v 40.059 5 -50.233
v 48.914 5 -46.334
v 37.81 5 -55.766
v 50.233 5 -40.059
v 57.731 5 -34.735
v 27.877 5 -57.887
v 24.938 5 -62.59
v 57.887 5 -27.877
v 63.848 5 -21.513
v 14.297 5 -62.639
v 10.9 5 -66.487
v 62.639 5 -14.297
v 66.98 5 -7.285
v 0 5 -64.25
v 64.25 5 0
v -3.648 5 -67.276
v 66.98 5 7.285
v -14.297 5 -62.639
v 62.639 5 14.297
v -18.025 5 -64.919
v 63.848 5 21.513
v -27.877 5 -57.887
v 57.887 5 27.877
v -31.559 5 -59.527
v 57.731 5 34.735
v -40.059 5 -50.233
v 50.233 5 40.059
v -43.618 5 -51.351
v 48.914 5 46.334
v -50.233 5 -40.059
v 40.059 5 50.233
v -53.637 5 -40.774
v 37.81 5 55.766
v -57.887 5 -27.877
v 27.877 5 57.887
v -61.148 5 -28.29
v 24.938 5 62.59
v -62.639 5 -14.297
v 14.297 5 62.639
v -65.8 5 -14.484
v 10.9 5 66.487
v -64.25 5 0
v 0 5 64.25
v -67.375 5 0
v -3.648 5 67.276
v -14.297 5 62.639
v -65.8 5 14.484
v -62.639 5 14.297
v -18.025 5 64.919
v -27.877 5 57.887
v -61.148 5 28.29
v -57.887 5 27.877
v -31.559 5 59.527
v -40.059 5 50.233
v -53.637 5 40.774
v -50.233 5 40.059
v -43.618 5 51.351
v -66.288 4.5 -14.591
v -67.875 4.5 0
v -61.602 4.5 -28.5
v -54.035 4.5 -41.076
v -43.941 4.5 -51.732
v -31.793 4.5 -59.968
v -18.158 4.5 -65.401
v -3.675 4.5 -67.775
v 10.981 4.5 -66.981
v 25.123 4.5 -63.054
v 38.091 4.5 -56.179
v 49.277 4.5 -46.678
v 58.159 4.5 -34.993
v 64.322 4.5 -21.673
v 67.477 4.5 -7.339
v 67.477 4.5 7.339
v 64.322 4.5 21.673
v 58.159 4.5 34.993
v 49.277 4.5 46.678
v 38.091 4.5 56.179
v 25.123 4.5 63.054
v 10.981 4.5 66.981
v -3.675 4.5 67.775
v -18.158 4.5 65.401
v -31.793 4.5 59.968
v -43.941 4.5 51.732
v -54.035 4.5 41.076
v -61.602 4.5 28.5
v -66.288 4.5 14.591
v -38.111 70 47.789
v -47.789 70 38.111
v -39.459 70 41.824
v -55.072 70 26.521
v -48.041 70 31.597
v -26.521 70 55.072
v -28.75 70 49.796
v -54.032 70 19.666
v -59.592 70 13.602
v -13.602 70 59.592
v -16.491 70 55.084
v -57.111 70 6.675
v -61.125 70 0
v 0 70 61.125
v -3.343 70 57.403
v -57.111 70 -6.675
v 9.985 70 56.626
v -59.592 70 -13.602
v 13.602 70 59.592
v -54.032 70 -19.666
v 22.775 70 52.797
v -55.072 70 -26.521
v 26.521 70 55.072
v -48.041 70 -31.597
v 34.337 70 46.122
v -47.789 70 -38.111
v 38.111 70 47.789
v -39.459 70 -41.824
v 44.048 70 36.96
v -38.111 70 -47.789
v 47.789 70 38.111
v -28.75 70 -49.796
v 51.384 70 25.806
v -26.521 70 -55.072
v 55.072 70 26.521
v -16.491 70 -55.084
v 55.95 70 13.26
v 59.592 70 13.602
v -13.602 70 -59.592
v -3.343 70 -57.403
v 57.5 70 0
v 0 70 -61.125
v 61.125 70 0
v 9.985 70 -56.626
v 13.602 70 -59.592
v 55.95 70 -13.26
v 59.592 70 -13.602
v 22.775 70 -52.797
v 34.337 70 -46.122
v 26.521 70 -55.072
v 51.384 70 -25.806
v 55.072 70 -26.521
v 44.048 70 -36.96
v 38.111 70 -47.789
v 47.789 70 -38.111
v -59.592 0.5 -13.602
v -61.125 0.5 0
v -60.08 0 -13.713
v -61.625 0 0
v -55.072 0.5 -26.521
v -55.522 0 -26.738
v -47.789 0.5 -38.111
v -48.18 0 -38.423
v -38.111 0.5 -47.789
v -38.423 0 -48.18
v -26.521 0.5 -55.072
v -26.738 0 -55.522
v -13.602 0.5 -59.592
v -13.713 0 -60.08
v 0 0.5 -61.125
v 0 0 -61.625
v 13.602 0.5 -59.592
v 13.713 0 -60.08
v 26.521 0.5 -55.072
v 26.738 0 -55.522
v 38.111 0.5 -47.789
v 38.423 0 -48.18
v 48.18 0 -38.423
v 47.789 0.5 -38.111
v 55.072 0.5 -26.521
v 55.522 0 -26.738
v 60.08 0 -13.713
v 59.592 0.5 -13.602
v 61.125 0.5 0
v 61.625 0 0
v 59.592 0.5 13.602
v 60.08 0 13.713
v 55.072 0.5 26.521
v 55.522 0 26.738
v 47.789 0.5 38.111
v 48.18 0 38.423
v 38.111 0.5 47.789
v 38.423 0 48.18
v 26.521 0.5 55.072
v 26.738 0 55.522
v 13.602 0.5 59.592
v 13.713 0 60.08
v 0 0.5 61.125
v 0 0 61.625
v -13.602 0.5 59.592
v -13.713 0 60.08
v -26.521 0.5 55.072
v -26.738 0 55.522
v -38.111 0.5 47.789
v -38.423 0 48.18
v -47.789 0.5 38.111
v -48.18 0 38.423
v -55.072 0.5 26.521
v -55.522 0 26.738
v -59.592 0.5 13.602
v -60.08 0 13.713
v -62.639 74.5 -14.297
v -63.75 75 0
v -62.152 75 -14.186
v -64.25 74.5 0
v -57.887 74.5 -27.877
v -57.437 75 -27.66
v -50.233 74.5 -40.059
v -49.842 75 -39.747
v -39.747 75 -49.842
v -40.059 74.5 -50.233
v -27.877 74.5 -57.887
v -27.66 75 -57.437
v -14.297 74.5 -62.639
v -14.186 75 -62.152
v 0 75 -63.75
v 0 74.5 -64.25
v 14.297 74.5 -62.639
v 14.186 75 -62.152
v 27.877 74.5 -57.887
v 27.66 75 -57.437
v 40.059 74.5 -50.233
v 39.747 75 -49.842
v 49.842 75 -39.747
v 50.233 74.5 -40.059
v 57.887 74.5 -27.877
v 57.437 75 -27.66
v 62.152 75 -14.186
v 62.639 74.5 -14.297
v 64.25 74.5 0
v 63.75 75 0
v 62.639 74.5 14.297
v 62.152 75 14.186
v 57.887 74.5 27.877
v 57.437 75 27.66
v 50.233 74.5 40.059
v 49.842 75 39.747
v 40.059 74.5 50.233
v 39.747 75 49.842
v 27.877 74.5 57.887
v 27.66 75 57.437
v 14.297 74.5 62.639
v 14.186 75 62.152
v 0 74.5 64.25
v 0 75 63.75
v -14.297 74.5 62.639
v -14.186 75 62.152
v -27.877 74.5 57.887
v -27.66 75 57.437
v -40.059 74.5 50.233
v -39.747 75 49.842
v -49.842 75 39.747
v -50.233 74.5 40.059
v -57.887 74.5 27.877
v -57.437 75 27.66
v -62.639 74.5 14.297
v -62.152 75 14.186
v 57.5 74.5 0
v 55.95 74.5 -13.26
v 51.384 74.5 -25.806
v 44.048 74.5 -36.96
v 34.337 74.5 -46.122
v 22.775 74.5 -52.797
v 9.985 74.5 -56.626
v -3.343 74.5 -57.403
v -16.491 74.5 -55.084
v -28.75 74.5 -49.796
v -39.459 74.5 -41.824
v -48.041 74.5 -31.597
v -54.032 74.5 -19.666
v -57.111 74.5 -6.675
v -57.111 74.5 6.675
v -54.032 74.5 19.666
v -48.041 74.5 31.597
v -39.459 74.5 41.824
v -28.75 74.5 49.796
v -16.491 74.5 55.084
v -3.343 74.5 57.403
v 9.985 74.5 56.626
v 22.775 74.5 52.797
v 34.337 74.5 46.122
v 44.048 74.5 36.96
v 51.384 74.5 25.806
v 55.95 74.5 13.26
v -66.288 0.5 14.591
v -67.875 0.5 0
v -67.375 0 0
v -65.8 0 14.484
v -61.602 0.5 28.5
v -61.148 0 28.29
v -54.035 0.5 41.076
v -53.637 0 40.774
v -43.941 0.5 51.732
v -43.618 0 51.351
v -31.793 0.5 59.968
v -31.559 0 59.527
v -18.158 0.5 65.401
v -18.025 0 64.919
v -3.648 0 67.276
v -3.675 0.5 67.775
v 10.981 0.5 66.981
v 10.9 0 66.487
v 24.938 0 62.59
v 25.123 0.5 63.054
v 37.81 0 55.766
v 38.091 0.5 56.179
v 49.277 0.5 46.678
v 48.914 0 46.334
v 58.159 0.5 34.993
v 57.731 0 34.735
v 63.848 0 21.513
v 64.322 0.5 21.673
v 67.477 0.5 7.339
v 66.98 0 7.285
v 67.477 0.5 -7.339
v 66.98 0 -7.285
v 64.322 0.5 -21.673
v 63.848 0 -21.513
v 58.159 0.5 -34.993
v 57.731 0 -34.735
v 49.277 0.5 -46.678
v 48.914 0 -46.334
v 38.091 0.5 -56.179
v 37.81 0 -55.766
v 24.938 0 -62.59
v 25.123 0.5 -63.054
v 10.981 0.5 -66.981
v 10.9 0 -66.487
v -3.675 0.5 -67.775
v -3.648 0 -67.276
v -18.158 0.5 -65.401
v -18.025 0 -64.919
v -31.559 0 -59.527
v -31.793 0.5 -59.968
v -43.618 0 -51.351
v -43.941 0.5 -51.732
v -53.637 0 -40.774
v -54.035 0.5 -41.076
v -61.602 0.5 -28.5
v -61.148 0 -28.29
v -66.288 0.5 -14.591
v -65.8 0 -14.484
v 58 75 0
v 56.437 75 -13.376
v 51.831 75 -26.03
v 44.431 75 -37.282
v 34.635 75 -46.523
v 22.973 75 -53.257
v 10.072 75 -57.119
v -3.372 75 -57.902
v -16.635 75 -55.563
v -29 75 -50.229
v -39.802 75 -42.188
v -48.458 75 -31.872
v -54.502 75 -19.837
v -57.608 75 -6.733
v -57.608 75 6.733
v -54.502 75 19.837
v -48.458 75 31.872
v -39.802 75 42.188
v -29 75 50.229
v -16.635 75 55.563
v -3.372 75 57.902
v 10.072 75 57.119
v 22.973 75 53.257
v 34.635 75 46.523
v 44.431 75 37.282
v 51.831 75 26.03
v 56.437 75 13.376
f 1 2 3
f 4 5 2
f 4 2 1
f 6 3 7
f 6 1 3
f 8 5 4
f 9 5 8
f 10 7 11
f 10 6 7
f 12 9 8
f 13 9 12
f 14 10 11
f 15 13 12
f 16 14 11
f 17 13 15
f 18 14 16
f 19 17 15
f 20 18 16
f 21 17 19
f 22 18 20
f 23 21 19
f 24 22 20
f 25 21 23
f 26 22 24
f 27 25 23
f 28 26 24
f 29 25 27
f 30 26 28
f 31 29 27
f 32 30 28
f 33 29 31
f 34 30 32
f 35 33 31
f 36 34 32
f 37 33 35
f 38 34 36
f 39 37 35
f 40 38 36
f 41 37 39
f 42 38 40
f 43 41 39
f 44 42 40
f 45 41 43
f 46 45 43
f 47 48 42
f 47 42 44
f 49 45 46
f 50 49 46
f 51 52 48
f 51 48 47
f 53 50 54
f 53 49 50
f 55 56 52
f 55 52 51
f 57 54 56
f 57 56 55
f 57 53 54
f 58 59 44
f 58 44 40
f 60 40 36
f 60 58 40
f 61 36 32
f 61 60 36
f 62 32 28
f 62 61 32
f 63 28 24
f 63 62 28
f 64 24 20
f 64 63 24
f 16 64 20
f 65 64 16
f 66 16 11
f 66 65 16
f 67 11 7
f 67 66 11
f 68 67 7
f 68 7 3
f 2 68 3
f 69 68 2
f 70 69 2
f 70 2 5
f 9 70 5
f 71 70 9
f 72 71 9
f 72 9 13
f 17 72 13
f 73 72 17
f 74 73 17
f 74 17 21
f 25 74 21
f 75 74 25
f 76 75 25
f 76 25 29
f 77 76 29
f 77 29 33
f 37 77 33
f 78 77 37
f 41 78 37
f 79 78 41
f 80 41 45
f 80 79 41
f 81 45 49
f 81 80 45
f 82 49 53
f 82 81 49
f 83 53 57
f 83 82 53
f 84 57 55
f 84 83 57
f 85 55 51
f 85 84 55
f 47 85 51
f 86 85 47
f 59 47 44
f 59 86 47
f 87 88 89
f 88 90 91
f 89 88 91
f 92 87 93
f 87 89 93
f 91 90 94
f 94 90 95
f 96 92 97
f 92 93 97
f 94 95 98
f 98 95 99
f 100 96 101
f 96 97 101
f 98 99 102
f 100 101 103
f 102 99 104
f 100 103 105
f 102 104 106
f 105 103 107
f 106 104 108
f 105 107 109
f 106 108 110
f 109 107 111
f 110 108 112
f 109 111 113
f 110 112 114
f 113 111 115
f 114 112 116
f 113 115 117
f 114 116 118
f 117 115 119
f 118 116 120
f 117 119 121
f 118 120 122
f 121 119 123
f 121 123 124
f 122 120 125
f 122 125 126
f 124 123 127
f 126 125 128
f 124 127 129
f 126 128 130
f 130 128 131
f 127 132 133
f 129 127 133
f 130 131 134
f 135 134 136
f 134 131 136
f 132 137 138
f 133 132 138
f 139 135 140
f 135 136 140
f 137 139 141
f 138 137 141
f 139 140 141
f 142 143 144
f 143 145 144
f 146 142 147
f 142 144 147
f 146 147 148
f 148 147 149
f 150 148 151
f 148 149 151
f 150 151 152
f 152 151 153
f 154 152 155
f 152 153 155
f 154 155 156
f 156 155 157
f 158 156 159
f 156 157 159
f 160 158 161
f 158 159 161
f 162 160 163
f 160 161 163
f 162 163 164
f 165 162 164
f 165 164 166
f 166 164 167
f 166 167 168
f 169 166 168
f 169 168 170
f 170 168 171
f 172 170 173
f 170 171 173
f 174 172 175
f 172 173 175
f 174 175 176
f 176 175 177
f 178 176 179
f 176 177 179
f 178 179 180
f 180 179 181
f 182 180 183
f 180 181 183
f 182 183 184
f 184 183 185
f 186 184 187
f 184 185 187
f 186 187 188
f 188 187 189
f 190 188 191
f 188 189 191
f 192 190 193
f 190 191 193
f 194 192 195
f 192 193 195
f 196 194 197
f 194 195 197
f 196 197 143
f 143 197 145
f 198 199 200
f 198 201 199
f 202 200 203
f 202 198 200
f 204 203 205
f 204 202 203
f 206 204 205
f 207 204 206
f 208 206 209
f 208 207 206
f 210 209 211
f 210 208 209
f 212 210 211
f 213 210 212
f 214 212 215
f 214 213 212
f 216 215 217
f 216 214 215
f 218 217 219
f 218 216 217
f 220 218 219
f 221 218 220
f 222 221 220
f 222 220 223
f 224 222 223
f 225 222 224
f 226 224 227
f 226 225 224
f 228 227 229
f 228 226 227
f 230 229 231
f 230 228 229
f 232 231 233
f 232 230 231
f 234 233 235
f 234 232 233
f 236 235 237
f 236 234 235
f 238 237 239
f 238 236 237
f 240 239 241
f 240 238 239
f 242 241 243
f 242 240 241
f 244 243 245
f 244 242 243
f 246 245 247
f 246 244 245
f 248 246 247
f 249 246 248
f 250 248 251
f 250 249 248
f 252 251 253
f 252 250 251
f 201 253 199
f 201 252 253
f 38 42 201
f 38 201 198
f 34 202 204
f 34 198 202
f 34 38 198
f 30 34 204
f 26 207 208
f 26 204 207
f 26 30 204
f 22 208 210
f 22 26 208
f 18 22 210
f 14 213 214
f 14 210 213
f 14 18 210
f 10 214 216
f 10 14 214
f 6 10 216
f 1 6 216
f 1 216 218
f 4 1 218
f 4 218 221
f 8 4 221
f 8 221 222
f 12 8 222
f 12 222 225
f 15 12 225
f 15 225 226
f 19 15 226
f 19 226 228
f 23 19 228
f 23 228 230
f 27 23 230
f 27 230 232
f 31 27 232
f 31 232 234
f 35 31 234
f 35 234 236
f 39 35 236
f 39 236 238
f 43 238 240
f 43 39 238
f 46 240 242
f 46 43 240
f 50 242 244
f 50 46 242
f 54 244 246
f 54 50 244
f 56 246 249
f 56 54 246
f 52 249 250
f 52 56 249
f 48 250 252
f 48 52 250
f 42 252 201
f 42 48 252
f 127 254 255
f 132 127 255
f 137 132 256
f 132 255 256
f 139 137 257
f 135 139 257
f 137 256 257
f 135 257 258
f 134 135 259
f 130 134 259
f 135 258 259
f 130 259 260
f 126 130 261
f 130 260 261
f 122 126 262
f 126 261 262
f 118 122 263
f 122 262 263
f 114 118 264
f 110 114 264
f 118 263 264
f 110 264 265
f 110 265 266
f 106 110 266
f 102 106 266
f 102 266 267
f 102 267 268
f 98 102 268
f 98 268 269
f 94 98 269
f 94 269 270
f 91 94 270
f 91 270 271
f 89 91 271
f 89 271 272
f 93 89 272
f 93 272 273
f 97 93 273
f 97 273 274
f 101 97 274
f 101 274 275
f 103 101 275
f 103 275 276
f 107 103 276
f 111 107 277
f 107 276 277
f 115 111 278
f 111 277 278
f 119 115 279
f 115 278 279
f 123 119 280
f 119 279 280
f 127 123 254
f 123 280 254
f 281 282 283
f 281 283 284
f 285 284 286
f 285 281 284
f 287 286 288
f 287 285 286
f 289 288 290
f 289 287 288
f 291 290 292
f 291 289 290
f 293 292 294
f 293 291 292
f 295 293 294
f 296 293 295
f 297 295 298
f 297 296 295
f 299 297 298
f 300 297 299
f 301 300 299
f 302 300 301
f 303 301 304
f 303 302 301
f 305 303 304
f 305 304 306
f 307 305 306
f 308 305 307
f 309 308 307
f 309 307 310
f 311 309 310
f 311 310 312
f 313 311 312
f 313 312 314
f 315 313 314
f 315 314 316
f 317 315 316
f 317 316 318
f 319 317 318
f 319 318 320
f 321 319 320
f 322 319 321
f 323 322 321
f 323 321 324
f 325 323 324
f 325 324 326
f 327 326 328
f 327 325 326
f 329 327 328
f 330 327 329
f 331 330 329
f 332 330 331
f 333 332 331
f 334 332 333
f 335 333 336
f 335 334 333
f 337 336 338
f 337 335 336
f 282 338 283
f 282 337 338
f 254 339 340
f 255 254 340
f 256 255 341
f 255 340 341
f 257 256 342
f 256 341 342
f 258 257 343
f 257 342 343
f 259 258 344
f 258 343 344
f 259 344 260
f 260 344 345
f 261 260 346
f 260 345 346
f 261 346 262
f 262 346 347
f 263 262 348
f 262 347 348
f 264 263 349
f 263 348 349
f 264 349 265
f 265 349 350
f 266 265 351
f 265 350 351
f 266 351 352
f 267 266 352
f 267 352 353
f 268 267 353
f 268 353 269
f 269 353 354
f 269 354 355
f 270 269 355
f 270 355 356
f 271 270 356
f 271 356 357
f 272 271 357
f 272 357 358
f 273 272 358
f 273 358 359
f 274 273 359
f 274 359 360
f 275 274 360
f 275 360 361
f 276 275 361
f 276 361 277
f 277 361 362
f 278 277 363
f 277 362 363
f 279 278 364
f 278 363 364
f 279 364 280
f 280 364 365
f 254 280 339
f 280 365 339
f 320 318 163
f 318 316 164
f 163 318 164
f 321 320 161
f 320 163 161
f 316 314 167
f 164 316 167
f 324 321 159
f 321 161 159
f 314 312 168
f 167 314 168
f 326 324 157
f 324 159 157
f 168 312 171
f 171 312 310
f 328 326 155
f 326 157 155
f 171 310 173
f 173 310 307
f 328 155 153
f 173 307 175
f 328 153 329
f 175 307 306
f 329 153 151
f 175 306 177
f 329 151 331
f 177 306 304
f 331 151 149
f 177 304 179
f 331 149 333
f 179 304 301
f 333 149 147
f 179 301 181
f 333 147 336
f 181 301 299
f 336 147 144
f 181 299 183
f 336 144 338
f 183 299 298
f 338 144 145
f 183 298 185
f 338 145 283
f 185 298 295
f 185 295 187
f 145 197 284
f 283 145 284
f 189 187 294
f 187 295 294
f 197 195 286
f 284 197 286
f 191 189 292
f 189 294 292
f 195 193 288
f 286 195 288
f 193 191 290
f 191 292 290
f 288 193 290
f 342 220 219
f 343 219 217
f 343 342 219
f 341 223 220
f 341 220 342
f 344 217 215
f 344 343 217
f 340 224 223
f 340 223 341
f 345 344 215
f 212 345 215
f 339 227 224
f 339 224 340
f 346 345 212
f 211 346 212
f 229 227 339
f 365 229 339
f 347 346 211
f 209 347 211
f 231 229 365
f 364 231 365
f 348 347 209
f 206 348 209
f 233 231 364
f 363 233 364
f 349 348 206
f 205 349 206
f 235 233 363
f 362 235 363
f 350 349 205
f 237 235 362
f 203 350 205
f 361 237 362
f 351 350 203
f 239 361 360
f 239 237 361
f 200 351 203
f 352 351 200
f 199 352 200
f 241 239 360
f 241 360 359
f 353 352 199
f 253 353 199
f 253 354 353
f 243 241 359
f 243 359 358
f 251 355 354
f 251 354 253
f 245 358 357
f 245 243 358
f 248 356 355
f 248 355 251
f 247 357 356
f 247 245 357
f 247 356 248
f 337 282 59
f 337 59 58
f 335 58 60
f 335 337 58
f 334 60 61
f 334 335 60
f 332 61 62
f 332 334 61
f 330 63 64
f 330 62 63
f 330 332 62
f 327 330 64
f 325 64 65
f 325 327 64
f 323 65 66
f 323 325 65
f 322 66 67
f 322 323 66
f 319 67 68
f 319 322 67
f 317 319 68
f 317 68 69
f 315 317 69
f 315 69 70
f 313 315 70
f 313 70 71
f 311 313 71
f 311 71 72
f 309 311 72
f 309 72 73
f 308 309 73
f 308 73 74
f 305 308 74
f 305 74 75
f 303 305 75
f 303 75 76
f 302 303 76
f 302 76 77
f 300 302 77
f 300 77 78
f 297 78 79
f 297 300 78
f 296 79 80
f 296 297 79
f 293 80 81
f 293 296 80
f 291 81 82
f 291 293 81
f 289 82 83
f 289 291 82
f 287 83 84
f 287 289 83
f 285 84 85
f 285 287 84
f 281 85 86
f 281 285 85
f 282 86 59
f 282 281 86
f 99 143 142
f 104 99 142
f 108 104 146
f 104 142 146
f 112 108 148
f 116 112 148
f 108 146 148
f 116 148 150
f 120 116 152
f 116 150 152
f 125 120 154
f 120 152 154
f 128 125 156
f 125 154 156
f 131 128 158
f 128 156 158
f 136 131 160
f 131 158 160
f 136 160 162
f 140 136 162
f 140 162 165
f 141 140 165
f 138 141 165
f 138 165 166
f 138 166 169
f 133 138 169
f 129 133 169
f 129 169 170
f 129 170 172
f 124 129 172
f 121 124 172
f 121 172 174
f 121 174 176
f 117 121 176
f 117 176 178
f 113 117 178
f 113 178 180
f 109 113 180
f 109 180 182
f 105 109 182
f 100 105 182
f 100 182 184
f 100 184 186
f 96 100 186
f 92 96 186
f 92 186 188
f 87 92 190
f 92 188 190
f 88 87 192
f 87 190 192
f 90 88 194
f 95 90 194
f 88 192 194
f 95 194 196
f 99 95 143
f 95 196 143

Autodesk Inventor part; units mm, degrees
ref_plane "YZ Plane" through (0, 0, 0) normal (1, 0, 0) x (0, 1, 0)
ref_plane "XZ Plane" through (0, 0, 0) normal (0, 1, 0) x (-1, 0, 0)
ref_plane "XY Plane" through (0, 0, 0) normal (0, 0, 1) x (1, 0, 0)
sketch "Sketch1" plane through (0, 0, 0) normal (0, 1, 0) x (-1, 0, 0)
  circle A0 centre (0, 0) radius 67.875
  circle A1 centre (0, 0) radius 64.25
  circle A2 centre (0, 0) radius 61.125
  circle A3 centre (0, 0) radius 9.5
  dimension "Absolute_Diameter" = 135.75
  dimension "Diameter_No_Outer_Lip" = 128.5
  dimension "Inner_Cylinder_Diameter" = 122.25
  dimension "Lip_Diameter" = 19
extrude "Extrusion1" add sketch "Sketch1" along normal blind 5 contours A0
extrude "Extrusion2" add sketch "Sketch1" along normal blind 75 contours A1
sketch "Sketch2" plane through (0, 75, 0) normal (0, 1, 0) x (1, 0, 0)
  circle A0 centre (0, 0) radius 64.25
  circle A1 centre (0, 0) radius 57.5
  dimension "Lip_Diameter_Out" = 128.5
  dimension "Inner_Lip_Diameter" = 115
extrude "Extrusion7" add sketch "Sketch2" against normal blind 5
chamfer "Chamfer1" distance 0.5 angle 45 2 edges at (64.25, 75, 0) (-57.5, 75, 0)
chamfer "Chamfer2" distance 0.5 angle 45 3 edges at (67.875, 5, 0) (67.875, 0, 0) (61.125, 0, 0)
sketch "Sketch3" plane through (0, 5, 0) normal (0, 1, 0) x (1, 0, 0)
  circle A0 centre (0, 0) radius 127.5
  circle A1 centre (-127.5, 0) radius 2
  circle A2 centre (-103.1497, -74.9426) radius 2
  circle A3 centre (-39.3997, -121.2597) radius 2
  circle A4 centre (39.3997, -121.2597) radius 2
  circle A5 centre (103.1497, -74.9426) radius 2
  circle A6 centre (127.5, 0) radius 2
  circle A7 centre (103.1497, 74.9426) radius 2
  circle A8 centre (39.3997, 121.2597) radius 2
  circle A9 centre (-39.3997, 121.2597) radius 2
  circle A10 centre (-103.1497, 74.9426) radius 2
  dimension "d27" = 255
  dimension "d28" = 4
  dimension "d31" = 360
extrude "Extrusion8" [suppressed]
sketch "Sketch4" plane through (0, 75, 0) normal (0, 1, 0) x (1, 0, 0)
  circle A0 centre (0, 0) radius 42.5
  circle A1 centre (0, 0) radius 37.5
  circle A2 centre (0, 0) radius 40
  circle A3 centre (-40, 0) radius 1
  circle A4 centre (-24.9396, -31.2733) radius 1
  circle A5 centre (8.9008, -38.9971) radius 1
  circle A6 centre (36.0388, -17.3553) radius 1
  circle A7 centre (36.0388, 17.3553) radius 1
  circle A8 centre (8.9008, 38.9971) radius 1
  circle A9 centre (-24.9396, 31.2733) radius 1
  dimension "d35" = 80
  dimension "d36" = 2
  dimension "d39" = 360
hole "Hole1" [suppressed]
properties part number "Cylinder  Segment - 08"
